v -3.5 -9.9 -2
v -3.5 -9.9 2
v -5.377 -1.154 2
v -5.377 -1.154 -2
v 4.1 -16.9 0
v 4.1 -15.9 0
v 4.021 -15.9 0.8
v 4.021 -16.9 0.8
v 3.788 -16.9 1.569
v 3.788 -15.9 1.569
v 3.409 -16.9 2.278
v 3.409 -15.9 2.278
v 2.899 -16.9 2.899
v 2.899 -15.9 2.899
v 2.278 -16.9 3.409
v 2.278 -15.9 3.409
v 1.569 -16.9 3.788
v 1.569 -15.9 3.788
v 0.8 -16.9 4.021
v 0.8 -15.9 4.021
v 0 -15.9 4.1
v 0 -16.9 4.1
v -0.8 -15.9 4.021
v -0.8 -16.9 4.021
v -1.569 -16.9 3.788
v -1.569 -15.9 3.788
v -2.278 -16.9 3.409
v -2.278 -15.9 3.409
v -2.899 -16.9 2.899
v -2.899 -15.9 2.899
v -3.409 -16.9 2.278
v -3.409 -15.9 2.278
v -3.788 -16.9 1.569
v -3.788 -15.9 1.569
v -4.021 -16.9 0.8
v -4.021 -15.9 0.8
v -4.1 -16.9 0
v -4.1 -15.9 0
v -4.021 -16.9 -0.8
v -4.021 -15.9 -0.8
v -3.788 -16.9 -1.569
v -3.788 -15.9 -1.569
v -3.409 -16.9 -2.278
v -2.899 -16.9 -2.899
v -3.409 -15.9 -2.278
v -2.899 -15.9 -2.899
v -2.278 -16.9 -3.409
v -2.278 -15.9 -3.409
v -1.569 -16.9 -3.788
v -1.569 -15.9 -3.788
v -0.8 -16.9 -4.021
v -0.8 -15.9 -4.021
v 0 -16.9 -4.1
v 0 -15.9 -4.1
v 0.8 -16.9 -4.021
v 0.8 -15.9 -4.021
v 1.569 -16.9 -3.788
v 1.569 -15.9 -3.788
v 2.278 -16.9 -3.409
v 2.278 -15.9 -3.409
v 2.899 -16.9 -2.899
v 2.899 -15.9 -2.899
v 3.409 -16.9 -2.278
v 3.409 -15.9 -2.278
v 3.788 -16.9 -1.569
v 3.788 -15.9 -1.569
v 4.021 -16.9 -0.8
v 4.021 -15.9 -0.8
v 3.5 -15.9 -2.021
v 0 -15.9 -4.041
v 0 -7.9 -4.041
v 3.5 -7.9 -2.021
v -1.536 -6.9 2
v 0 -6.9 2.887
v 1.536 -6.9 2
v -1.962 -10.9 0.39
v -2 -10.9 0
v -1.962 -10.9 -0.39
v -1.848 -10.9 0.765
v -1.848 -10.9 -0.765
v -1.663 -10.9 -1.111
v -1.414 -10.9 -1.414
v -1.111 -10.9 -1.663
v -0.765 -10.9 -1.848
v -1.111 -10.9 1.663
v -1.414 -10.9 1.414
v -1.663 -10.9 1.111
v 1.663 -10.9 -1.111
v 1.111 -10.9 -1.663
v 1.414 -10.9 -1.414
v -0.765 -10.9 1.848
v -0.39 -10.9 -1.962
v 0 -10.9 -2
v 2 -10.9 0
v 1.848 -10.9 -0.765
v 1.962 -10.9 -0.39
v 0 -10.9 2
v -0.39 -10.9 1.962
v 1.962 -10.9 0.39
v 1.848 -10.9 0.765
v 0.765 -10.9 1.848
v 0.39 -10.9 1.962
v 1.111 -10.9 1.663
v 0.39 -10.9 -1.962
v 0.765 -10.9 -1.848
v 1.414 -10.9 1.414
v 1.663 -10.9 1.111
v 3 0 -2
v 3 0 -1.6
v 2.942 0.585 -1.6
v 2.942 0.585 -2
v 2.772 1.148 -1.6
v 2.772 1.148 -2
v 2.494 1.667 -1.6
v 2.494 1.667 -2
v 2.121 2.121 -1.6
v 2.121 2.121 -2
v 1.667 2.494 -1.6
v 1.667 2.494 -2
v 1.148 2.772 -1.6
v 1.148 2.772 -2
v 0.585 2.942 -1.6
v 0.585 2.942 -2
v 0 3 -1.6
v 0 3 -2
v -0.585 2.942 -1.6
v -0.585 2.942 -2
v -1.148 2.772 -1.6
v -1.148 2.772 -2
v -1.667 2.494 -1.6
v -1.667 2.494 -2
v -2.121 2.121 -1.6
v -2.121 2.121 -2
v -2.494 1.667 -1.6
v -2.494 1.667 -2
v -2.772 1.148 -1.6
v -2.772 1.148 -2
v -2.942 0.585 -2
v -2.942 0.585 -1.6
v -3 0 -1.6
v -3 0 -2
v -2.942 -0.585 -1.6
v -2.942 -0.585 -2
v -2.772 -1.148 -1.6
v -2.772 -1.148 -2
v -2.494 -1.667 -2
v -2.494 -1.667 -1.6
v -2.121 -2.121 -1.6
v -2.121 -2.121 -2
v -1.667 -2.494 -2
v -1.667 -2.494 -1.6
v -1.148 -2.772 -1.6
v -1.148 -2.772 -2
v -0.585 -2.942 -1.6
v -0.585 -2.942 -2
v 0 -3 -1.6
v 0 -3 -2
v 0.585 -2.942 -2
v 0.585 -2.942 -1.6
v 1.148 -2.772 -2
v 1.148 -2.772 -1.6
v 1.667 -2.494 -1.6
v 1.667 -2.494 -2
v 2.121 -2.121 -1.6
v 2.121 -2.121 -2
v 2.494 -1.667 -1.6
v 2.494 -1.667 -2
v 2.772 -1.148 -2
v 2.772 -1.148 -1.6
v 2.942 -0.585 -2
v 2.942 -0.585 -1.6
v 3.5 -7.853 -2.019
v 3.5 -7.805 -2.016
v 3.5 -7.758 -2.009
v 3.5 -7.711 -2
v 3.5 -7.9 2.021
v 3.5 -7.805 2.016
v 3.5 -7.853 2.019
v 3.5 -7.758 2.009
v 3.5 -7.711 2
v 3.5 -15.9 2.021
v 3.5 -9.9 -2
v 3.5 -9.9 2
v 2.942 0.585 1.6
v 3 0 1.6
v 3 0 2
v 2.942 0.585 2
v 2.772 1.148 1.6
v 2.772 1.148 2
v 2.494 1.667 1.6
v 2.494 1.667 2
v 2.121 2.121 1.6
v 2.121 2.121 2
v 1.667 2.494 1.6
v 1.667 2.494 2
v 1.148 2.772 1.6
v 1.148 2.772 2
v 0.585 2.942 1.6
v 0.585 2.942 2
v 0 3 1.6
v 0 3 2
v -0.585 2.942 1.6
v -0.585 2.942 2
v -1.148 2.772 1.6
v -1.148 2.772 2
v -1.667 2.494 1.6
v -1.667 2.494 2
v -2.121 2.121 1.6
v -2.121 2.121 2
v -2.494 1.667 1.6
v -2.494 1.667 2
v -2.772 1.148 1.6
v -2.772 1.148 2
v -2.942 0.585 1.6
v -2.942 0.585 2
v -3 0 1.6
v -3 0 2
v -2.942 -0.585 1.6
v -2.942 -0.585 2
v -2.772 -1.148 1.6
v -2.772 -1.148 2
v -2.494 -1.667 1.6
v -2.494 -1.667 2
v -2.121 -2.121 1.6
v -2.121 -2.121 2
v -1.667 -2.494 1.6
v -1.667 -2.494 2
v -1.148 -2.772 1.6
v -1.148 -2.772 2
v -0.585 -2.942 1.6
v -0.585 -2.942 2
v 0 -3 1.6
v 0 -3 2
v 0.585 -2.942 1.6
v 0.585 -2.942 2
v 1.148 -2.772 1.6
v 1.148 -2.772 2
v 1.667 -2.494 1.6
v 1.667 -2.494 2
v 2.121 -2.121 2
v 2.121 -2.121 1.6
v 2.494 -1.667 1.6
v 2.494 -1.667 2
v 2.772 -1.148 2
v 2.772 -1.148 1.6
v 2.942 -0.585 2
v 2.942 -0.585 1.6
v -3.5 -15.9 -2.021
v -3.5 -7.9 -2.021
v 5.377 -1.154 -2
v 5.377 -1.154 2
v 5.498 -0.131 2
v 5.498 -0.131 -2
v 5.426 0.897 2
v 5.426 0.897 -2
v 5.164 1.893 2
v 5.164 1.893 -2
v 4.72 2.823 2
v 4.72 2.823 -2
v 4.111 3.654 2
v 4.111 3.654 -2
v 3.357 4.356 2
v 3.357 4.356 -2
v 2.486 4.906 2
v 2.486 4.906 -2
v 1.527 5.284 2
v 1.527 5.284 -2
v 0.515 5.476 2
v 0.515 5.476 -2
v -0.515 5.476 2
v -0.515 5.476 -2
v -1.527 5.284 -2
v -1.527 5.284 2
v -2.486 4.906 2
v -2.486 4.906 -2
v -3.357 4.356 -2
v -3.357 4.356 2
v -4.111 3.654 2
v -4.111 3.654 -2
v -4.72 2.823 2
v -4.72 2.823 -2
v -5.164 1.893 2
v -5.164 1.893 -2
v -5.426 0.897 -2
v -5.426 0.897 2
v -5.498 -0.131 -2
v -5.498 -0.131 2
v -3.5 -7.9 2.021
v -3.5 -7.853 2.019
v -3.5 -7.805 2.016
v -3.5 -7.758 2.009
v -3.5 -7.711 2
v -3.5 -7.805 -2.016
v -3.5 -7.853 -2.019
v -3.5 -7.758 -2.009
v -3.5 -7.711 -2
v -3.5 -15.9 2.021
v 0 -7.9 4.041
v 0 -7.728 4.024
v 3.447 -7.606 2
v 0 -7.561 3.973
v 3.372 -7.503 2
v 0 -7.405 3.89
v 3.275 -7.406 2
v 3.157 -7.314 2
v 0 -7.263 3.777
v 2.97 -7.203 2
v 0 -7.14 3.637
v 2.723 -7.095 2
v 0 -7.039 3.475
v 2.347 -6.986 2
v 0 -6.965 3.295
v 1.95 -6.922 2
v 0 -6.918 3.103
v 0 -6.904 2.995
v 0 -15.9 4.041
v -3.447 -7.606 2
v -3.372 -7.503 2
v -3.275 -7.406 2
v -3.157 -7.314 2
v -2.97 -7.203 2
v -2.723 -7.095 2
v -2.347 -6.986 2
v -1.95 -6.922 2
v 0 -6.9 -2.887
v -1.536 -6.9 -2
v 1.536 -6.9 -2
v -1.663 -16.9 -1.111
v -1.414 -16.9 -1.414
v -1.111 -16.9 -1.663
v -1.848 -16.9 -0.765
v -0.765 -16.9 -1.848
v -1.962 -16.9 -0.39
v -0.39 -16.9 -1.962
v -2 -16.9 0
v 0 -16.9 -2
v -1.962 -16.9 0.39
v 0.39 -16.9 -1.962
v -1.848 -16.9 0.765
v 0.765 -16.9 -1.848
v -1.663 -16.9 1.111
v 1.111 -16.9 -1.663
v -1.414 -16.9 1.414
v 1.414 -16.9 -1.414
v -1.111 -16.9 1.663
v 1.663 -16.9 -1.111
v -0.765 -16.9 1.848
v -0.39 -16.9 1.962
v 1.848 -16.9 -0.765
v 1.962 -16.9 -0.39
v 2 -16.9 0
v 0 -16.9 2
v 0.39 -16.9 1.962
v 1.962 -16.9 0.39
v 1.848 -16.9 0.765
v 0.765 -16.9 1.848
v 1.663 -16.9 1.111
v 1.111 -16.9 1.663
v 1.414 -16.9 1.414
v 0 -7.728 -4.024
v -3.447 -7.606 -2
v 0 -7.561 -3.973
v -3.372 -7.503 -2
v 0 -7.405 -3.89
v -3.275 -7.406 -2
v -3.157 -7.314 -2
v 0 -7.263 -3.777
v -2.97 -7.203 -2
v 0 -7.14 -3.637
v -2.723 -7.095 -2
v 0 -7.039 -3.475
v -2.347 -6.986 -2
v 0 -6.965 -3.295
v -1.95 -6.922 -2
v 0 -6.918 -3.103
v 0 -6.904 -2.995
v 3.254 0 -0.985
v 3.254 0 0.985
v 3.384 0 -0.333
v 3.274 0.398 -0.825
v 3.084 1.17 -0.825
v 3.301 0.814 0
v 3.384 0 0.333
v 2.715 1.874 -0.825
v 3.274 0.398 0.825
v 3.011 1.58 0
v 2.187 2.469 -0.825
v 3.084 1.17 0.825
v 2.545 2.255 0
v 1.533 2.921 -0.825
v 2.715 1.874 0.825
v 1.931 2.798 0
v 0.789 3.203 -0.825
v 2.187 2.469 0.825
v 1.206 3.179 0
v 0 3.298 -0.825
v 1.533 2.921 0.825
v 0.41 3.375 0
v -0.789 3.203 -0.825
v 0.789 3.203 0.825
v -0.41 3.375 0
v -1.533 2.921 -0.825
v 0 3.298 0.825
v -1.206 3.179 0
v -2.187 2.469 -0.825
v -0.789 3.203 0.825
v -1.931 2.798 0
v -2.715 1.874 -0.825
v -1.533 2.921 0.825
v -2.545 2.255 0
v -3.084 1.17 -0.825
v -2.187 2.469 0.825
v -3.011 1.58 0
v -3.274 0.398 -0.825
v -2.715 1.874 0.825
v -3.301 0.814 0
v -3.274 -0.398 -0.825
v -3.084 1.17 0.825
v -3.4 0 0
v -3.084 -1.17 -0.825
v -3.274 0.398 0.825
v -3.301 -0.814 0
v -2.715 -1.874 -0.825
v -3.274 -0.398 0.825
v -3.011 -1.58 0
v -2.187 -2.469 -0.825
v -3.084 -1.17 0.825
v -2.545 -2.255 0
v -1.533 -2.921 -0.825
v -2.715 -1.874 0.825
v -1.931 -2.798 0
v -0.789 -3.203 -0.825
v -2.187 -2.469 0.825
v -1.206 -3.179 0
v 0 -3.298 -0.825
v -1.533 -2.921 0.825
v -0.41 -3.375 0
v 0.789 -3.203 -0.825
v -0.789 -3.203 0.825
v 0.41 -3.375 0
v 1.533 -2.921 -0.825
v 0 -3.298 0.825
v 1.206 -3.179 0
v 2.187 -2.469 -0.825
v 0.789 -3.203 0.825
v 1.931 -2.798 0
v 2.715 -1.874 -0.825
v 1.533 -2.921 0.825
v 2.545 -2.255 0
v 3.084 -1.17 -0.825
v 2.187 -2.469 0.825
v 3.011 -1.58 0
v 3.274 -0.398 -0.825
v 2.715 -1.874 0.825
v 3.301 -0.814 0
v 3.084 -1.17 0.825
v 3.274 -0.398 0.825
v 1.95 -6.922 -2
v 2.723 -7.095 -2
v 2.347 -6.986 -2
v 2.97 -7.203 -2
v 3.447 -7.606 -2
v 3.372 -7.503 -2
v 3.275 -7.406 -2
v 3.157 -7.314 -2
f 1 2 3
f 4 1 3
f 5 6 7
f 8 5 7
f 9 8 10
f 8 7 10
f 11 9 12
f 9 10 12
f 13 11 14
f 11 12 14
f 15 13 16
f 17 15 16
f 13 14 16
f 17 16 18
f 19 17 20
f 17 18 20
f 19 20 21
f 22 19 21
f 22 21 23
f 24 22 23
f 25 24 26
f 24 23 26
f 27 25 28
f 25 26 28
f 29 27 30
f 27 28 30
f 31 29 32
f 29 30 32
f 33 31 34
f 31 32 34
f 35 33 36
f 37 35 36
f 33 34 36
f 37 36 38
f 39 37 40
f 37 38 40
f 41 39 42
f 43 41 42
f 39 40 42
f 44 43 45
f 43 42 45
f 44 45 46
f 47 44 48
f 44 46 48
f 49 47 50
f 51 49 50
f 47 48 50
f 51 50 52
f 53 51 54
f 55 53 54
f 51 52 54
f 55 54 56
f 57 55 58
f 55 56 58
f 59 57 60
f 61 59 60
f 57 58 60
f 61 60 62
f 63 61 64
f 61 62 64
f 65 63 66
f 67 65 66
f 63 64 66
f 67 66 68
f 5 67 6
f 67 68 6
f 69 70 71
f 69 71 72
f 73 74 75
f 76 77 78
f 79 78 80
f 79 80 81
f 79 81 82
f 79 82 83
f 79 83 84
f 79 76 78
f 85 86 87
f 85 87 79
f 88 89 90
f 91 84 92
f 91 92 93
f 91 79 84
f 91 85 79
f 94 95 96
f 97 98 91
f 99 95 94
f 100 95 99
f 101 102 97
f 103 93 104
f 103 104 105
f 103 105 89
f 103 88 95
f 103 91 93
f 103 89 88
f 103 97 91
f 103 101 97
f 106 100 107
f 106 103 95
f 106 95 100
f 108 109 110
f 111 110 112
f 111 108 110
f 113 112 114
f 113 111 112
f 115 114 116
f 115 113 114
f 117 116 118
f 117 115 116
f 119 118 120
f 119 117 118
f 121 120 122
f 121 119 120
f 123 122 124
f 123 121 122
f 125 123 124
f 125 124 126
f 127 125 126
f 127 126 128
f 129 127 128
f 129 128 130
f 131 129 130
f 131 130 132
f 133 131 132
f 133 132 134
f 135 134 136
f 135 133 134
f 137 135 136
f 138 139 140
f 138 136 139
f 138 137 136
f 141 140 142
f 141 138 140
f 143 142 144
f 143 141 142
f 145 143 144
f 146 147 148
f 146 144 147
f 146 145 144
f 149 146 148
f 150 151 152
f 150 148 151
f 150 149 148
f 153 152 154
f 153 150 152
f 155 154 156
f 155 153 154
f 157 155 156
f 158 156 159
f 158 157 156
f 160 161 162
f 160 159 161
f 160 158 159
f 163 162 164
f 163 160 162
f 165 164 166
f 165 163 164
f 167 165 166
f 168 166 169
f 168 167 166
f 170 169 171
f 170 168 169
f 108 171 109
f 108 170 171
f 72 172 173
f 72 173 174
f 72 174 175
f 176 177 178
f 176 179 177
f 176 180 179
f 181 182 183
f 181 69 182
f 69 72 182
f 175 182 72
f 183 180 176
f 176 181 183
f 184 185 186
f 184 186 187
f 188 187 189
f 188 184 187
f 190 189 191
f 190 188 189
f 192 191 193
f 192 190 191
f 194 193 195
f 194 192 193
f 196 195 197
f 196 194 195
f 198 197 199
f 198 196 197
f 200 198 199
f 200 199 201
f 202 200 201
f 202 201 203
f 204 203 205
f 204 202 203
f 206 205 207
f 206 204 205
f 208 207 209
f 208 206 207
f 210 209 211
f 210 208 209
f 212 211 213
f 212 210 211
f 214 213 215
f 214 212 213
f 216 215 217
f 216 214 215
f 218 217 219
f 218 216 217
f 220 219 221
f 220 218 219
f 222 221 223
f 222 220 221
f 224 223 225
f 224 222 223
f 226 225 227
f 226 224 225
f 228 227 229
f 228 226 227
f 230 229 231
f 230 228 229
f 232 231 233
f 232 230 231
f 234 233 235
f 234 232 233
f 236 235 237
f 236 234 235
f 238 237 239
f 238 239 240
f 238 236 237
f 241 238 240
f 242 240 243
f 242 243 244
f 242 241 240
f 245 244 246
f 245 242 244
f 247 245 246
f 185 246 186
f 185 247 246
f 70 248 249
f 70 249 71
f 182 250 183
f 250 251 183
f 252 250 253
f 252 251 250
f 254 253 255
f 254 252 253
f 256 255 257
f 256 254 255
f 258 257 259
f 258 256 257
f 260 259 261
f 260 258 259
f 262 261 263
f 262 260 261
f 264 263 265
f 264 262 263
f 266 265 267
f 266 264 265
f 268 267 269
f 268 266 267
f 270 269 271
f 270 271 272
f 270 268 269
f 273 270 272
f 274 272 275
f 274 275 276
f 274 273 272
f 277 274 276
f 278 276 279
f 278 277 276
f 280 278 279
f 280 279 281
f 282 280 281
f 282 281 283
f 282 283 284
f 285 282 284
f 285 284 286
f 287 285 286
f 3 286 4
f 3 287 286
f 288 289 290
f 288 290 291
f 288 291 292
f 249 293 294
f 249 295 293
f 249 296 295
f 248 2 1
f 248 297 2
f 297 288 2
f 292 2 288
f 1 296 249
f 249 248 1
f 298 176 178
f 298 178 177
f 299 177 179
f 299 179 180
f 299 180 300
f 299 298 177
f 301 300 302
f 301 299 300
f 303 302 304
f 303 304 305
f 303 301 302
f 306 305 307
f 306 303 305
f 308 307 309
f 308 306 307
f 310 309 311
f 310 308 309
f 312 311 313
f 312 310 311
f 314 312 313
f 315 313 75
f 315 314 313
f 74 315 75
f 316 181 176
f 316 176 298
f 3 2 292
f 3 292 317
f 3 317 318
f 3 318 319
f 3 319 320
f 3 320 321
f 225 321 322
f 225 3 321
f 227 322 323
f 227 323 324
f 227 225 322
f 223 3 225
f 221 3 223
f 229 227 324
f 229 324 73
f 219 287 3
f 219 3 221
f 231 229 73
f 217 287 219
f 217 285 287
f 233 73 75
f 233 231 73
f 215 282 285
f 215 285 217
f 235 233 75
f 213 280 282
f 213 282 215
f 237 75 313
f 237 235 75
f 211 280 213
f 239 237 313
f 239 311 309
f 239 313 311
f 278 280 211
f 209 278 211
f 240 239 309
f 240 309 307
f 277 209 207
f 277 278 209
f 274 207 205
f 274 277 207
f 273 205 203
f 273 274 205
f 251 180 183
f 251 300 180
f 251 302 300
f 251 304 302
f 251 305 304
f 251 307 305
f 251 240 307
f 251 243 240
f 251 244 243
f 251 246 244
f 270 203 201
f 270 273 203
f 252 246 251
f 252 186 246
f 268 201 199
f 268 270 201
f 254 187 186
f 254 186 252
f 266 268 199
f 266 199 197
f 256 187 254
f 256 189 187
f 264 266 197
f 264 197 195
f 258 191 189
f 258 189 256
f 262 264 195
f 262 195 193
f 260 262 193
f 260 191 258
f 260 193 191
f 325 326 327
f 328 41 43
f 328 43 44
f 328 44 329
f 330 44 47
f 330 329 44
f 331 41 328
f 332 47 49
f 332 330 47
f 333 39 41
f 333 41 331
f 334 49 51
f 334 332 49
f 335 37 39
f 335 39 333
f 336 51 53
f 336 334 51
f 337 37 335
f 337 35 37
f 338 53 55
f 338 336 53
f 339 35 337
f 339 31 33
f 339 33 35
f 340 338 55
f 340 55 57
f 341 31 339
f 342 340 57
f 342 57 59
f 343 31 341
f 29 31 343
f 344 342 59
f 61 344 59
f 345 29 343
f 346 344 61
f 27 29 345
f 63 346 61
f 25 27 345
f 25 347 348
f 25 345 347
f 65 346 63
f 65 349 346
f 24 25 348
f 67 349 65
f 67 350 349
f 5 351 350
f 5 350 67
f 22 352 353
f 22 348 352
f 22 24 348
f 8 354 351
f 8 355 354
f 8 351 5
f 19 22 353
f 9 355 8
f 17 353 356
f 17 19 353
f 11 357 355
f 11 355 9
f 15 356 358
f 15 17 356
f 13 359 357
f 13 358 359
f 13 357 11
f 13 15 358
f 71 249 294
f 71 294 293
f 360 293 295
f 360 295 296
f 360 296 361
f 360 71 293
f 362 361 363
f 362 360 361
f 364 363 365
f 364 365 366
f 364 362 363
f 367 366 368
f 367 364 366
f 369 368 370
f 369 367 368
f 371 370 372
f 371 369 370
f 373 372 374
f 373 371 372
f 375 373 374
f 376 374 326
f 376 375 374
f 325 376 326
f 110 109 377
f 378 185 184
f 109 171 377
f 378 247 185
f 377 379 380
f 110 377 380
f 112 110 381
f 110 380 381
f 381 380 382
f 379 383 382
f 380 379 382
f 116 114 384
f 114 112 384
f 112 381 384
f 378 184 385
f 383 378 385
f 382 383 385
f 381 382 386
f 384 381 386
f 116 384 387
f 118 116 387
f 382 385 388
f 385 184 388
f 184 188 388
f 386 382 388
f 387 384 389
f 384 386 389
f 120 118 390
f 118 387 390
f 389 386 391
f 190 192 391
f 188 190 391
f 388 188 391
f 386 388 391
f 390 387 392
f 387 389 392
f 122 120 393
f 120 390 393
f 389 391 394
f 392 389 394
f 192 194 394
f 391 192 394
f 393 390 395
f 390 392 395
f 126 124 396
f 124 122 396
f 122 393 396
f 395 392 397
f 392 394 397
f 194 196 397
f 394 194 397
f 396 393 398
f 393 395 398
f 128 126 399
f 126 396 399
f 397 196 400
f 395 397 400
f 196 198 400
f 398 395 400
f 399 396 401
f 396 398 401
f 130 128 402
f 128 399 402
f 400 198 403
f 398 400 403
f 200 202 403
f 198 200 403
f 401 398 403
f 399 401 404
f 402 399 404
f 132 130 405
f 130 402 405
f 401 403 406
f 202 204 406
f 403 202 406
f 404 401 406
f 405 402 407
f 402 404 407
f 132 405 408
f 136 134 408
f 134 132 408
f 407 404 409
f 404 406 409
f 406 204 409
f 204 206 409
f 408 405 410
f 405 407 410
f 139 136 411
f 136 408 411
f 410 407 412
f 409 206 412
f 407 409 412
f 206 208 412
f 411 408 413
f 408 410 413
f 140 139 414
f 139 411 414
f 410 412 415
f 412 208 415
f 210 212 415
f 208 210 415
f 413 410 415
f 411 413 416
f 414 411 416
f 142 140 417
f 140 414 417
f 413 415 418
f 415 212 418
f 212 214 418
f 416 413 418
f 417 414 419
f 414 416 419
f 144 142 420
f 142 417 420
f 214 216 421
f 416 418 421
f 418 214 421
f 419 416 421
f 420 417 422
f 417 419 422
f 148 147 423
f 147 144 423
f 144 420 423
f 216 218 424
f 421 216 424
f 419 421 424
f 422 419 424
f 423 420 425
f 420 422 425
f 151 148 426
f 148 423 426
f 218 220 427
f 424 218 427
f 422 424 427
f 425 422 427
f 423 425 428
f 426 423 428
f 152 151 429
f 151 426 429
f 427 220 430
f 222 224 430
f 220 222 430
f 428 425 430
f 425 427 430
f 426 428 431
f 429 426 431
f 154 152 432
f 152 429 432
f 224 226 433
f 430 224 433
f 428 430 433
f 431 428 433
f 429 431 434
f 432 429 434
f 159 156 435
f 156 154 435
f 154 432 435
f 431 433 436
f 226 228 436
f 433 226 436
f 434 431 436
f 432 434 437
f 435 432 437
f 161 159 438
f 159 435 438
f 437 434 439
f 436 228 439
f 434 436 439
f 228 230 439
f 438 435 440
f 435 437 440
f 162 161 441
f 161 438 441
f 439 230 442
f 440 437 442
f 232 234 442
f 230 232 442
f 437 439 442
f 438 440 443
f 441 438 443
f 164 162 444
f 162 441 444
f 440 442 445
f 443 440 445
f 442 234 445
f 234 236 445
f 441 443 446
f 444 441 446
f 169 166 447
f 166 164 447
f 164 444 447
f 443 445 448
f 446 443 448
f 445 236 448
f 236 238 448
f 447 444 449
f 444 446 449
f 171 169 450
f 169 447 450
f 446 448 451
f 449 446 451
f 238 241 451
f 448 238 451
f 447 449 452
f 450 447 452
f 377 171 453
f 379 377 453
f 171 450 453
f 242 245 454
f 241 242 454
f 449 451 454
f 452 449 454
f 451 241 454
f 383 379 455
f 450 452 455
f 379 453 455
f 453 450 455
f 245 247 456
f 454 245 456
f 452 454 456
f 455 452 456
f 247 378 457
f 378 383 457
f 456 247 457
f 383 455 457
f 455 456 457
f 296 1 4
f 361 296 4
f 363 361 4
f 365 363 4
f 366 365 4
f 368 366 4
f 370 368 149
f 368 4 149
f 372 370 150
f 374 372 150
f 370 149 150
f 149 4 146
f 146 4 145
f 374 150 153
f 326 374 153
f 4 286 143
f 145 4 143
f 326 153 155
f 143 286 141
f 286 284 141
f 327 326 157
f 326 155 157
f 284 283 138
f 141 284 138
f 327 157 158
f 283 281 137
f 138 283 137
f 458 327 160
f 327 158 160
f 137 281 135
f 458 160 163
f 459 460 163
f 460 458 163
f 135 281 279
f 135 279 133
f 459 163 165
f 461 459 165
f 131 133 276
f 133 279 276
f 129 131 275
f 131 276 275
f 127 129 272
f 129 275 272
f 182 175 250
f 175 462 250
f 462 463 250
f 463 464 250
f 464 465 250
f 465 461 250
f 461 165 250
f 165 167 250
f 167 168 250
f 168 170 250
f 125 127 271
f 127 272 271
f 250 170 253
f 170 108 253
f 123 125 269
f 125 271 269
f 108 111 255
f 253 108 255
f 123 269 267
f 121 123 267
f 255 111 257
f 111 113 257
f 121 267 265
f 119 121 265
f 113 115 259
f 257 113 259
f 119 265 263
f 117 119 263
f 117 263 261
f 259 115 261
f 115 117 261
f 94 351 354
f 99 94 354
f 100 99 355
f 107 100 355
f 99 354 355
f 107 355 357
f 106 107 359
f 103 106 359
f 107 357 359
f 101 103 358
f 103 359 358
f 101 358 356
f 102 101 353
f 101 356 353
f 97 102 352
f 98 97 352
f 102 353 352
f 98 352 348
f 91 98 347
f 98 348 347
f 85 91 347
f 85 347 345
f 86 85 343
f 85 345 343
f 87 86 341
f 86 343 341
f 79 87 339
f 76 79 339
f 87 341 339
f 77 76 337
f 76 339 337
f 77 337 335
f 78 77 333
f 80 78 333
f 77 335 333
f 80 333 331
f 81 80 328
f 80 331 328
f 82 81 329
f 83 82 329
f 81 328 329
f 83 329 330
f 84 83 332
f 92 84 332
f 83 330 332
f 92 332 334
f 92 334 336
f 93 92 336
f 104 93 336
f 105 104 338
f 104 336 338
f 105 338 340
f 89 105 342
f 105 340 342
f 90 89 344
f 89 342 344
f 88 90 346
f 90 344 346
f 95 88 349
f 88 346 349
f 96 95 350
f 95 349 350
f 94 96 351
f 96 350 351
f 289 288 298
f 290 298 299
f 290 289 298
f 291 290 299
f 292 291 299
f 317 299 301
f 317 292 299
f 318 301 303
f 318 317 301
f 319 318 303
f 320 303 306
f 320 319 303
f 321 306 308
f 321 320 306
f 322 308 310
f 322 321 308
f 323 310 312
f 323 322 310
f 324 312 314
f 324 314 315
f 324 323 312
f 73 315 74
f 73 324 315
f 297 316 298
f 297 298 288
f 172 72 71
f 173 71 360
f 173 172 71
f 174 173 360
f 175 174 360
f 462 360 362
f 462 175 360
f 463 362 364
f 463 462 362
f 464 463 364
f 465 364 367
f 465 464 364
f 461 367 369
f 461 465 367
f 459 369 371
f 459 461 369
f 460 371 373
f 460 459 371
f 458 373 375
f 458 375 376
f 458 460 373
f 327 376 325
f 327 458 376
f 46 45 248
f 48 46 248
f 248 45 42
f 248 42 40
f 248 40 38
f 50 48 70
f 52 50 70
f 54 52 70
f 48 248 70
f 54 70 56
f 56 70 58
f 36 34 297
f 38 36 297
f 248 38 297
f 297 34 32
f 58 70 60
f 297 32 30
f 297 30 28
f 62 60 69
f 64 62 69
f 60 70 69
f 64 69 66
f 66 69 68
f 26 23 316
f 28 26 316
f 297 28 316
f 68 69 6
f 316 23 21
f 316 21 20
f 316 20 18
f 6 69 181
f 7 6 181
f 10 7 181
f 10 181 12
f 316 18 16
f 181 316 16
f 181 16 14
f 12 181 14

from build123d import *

# Parameters (mm, degrees)
SKETCH_R     = 3
PAD_DEPTH    = 2
PAD001_DEPTH = 9
SKETCH002_R  = 4.1
PAD002_DEPTH = 1
SKETCH003_R  = 2
POCKET_DEPTH = 6
FILLET_R     = 1


with BuildPart() as revolution:
    # Sketch004 → Revolution (revolve)
    with BuildSketch(Plane.XZ):
        with BuildLine():
            ThreePointArc((0, -3.4), (3.4, 0), (0, 3.4))
            Line((0, 3.4), (0, -3.4))
        make_face()
    revolve(axis=Axis((0, 0, 0), (0, 0, 1)))


with BuildPart() as cut:
    # Sketch → Pad (new body, symmetric)
    with BuildSketch(Plane.XY):
        with BuildLine():
            ThreePointArc((5.377475, -1.154453), (0, 5.5), (-5.377475, -1.154453))
            Line((-3.5, -9.9), (-5.377475, -1.154453))
            Line((-3.5, -15.9), (-3.5, -9.9))
            Line((3.5, -15.9), (-3.5, -15.9))
            Line((3.5, -9.9), (3.5, -15.9))
            Line((5.377475, -1.154453), (3.5, -9.9))
        make_face()
        Circle(SKETCH_R, mode=Mode.SUBTRACT)
    extrude(amount=PAD_DEPTH, both=True)

    # Sketch001 → Pad001 (new body)
    with BuildSketch(Plane.XZ.offset(15.9)):
        Polygon((3.5, 2.020726), (0, 4.041452), (-3.5, 2.020726), (-3.5, -2.020726), (0, -4.041452), (3.5, -2.020726), align=None)
    extrude(amount=-PAD001_DEPTH)

    # Sketch002 → Pad002 (new body)
    with BuildSketch(Plane.XZ.offset(15.9)):
        Circle(SKETCH002_R)
    extrude(amount=PAD002_DEPTH)

    # Sketch003 → Pocket (cut)
    with BuildSketch(Plane.XZ.offset(16.9)):
        Circle(SKETCH003_R)
    extrude(amount=-POCKET_DEPTH, mode=Mode.SUBTRACT)

    # Fillet
    fillet_edges = [cut.edges().sort_by_distance(p)[0] for p in [
        (-1.75, -6.9, 3.031089),
        (1.75, -6.9, 3.031089),
        (-1.75, -6.9, -3.031089),
        (1.75, -6.9, -3.031089),
    ]]
    fillet(fillet_edges, radius=FILLET_R)

    # Cut: cut Revolution
    add(revolution.part, mode=Mode.SUBTRACT)


solid = cut.part
